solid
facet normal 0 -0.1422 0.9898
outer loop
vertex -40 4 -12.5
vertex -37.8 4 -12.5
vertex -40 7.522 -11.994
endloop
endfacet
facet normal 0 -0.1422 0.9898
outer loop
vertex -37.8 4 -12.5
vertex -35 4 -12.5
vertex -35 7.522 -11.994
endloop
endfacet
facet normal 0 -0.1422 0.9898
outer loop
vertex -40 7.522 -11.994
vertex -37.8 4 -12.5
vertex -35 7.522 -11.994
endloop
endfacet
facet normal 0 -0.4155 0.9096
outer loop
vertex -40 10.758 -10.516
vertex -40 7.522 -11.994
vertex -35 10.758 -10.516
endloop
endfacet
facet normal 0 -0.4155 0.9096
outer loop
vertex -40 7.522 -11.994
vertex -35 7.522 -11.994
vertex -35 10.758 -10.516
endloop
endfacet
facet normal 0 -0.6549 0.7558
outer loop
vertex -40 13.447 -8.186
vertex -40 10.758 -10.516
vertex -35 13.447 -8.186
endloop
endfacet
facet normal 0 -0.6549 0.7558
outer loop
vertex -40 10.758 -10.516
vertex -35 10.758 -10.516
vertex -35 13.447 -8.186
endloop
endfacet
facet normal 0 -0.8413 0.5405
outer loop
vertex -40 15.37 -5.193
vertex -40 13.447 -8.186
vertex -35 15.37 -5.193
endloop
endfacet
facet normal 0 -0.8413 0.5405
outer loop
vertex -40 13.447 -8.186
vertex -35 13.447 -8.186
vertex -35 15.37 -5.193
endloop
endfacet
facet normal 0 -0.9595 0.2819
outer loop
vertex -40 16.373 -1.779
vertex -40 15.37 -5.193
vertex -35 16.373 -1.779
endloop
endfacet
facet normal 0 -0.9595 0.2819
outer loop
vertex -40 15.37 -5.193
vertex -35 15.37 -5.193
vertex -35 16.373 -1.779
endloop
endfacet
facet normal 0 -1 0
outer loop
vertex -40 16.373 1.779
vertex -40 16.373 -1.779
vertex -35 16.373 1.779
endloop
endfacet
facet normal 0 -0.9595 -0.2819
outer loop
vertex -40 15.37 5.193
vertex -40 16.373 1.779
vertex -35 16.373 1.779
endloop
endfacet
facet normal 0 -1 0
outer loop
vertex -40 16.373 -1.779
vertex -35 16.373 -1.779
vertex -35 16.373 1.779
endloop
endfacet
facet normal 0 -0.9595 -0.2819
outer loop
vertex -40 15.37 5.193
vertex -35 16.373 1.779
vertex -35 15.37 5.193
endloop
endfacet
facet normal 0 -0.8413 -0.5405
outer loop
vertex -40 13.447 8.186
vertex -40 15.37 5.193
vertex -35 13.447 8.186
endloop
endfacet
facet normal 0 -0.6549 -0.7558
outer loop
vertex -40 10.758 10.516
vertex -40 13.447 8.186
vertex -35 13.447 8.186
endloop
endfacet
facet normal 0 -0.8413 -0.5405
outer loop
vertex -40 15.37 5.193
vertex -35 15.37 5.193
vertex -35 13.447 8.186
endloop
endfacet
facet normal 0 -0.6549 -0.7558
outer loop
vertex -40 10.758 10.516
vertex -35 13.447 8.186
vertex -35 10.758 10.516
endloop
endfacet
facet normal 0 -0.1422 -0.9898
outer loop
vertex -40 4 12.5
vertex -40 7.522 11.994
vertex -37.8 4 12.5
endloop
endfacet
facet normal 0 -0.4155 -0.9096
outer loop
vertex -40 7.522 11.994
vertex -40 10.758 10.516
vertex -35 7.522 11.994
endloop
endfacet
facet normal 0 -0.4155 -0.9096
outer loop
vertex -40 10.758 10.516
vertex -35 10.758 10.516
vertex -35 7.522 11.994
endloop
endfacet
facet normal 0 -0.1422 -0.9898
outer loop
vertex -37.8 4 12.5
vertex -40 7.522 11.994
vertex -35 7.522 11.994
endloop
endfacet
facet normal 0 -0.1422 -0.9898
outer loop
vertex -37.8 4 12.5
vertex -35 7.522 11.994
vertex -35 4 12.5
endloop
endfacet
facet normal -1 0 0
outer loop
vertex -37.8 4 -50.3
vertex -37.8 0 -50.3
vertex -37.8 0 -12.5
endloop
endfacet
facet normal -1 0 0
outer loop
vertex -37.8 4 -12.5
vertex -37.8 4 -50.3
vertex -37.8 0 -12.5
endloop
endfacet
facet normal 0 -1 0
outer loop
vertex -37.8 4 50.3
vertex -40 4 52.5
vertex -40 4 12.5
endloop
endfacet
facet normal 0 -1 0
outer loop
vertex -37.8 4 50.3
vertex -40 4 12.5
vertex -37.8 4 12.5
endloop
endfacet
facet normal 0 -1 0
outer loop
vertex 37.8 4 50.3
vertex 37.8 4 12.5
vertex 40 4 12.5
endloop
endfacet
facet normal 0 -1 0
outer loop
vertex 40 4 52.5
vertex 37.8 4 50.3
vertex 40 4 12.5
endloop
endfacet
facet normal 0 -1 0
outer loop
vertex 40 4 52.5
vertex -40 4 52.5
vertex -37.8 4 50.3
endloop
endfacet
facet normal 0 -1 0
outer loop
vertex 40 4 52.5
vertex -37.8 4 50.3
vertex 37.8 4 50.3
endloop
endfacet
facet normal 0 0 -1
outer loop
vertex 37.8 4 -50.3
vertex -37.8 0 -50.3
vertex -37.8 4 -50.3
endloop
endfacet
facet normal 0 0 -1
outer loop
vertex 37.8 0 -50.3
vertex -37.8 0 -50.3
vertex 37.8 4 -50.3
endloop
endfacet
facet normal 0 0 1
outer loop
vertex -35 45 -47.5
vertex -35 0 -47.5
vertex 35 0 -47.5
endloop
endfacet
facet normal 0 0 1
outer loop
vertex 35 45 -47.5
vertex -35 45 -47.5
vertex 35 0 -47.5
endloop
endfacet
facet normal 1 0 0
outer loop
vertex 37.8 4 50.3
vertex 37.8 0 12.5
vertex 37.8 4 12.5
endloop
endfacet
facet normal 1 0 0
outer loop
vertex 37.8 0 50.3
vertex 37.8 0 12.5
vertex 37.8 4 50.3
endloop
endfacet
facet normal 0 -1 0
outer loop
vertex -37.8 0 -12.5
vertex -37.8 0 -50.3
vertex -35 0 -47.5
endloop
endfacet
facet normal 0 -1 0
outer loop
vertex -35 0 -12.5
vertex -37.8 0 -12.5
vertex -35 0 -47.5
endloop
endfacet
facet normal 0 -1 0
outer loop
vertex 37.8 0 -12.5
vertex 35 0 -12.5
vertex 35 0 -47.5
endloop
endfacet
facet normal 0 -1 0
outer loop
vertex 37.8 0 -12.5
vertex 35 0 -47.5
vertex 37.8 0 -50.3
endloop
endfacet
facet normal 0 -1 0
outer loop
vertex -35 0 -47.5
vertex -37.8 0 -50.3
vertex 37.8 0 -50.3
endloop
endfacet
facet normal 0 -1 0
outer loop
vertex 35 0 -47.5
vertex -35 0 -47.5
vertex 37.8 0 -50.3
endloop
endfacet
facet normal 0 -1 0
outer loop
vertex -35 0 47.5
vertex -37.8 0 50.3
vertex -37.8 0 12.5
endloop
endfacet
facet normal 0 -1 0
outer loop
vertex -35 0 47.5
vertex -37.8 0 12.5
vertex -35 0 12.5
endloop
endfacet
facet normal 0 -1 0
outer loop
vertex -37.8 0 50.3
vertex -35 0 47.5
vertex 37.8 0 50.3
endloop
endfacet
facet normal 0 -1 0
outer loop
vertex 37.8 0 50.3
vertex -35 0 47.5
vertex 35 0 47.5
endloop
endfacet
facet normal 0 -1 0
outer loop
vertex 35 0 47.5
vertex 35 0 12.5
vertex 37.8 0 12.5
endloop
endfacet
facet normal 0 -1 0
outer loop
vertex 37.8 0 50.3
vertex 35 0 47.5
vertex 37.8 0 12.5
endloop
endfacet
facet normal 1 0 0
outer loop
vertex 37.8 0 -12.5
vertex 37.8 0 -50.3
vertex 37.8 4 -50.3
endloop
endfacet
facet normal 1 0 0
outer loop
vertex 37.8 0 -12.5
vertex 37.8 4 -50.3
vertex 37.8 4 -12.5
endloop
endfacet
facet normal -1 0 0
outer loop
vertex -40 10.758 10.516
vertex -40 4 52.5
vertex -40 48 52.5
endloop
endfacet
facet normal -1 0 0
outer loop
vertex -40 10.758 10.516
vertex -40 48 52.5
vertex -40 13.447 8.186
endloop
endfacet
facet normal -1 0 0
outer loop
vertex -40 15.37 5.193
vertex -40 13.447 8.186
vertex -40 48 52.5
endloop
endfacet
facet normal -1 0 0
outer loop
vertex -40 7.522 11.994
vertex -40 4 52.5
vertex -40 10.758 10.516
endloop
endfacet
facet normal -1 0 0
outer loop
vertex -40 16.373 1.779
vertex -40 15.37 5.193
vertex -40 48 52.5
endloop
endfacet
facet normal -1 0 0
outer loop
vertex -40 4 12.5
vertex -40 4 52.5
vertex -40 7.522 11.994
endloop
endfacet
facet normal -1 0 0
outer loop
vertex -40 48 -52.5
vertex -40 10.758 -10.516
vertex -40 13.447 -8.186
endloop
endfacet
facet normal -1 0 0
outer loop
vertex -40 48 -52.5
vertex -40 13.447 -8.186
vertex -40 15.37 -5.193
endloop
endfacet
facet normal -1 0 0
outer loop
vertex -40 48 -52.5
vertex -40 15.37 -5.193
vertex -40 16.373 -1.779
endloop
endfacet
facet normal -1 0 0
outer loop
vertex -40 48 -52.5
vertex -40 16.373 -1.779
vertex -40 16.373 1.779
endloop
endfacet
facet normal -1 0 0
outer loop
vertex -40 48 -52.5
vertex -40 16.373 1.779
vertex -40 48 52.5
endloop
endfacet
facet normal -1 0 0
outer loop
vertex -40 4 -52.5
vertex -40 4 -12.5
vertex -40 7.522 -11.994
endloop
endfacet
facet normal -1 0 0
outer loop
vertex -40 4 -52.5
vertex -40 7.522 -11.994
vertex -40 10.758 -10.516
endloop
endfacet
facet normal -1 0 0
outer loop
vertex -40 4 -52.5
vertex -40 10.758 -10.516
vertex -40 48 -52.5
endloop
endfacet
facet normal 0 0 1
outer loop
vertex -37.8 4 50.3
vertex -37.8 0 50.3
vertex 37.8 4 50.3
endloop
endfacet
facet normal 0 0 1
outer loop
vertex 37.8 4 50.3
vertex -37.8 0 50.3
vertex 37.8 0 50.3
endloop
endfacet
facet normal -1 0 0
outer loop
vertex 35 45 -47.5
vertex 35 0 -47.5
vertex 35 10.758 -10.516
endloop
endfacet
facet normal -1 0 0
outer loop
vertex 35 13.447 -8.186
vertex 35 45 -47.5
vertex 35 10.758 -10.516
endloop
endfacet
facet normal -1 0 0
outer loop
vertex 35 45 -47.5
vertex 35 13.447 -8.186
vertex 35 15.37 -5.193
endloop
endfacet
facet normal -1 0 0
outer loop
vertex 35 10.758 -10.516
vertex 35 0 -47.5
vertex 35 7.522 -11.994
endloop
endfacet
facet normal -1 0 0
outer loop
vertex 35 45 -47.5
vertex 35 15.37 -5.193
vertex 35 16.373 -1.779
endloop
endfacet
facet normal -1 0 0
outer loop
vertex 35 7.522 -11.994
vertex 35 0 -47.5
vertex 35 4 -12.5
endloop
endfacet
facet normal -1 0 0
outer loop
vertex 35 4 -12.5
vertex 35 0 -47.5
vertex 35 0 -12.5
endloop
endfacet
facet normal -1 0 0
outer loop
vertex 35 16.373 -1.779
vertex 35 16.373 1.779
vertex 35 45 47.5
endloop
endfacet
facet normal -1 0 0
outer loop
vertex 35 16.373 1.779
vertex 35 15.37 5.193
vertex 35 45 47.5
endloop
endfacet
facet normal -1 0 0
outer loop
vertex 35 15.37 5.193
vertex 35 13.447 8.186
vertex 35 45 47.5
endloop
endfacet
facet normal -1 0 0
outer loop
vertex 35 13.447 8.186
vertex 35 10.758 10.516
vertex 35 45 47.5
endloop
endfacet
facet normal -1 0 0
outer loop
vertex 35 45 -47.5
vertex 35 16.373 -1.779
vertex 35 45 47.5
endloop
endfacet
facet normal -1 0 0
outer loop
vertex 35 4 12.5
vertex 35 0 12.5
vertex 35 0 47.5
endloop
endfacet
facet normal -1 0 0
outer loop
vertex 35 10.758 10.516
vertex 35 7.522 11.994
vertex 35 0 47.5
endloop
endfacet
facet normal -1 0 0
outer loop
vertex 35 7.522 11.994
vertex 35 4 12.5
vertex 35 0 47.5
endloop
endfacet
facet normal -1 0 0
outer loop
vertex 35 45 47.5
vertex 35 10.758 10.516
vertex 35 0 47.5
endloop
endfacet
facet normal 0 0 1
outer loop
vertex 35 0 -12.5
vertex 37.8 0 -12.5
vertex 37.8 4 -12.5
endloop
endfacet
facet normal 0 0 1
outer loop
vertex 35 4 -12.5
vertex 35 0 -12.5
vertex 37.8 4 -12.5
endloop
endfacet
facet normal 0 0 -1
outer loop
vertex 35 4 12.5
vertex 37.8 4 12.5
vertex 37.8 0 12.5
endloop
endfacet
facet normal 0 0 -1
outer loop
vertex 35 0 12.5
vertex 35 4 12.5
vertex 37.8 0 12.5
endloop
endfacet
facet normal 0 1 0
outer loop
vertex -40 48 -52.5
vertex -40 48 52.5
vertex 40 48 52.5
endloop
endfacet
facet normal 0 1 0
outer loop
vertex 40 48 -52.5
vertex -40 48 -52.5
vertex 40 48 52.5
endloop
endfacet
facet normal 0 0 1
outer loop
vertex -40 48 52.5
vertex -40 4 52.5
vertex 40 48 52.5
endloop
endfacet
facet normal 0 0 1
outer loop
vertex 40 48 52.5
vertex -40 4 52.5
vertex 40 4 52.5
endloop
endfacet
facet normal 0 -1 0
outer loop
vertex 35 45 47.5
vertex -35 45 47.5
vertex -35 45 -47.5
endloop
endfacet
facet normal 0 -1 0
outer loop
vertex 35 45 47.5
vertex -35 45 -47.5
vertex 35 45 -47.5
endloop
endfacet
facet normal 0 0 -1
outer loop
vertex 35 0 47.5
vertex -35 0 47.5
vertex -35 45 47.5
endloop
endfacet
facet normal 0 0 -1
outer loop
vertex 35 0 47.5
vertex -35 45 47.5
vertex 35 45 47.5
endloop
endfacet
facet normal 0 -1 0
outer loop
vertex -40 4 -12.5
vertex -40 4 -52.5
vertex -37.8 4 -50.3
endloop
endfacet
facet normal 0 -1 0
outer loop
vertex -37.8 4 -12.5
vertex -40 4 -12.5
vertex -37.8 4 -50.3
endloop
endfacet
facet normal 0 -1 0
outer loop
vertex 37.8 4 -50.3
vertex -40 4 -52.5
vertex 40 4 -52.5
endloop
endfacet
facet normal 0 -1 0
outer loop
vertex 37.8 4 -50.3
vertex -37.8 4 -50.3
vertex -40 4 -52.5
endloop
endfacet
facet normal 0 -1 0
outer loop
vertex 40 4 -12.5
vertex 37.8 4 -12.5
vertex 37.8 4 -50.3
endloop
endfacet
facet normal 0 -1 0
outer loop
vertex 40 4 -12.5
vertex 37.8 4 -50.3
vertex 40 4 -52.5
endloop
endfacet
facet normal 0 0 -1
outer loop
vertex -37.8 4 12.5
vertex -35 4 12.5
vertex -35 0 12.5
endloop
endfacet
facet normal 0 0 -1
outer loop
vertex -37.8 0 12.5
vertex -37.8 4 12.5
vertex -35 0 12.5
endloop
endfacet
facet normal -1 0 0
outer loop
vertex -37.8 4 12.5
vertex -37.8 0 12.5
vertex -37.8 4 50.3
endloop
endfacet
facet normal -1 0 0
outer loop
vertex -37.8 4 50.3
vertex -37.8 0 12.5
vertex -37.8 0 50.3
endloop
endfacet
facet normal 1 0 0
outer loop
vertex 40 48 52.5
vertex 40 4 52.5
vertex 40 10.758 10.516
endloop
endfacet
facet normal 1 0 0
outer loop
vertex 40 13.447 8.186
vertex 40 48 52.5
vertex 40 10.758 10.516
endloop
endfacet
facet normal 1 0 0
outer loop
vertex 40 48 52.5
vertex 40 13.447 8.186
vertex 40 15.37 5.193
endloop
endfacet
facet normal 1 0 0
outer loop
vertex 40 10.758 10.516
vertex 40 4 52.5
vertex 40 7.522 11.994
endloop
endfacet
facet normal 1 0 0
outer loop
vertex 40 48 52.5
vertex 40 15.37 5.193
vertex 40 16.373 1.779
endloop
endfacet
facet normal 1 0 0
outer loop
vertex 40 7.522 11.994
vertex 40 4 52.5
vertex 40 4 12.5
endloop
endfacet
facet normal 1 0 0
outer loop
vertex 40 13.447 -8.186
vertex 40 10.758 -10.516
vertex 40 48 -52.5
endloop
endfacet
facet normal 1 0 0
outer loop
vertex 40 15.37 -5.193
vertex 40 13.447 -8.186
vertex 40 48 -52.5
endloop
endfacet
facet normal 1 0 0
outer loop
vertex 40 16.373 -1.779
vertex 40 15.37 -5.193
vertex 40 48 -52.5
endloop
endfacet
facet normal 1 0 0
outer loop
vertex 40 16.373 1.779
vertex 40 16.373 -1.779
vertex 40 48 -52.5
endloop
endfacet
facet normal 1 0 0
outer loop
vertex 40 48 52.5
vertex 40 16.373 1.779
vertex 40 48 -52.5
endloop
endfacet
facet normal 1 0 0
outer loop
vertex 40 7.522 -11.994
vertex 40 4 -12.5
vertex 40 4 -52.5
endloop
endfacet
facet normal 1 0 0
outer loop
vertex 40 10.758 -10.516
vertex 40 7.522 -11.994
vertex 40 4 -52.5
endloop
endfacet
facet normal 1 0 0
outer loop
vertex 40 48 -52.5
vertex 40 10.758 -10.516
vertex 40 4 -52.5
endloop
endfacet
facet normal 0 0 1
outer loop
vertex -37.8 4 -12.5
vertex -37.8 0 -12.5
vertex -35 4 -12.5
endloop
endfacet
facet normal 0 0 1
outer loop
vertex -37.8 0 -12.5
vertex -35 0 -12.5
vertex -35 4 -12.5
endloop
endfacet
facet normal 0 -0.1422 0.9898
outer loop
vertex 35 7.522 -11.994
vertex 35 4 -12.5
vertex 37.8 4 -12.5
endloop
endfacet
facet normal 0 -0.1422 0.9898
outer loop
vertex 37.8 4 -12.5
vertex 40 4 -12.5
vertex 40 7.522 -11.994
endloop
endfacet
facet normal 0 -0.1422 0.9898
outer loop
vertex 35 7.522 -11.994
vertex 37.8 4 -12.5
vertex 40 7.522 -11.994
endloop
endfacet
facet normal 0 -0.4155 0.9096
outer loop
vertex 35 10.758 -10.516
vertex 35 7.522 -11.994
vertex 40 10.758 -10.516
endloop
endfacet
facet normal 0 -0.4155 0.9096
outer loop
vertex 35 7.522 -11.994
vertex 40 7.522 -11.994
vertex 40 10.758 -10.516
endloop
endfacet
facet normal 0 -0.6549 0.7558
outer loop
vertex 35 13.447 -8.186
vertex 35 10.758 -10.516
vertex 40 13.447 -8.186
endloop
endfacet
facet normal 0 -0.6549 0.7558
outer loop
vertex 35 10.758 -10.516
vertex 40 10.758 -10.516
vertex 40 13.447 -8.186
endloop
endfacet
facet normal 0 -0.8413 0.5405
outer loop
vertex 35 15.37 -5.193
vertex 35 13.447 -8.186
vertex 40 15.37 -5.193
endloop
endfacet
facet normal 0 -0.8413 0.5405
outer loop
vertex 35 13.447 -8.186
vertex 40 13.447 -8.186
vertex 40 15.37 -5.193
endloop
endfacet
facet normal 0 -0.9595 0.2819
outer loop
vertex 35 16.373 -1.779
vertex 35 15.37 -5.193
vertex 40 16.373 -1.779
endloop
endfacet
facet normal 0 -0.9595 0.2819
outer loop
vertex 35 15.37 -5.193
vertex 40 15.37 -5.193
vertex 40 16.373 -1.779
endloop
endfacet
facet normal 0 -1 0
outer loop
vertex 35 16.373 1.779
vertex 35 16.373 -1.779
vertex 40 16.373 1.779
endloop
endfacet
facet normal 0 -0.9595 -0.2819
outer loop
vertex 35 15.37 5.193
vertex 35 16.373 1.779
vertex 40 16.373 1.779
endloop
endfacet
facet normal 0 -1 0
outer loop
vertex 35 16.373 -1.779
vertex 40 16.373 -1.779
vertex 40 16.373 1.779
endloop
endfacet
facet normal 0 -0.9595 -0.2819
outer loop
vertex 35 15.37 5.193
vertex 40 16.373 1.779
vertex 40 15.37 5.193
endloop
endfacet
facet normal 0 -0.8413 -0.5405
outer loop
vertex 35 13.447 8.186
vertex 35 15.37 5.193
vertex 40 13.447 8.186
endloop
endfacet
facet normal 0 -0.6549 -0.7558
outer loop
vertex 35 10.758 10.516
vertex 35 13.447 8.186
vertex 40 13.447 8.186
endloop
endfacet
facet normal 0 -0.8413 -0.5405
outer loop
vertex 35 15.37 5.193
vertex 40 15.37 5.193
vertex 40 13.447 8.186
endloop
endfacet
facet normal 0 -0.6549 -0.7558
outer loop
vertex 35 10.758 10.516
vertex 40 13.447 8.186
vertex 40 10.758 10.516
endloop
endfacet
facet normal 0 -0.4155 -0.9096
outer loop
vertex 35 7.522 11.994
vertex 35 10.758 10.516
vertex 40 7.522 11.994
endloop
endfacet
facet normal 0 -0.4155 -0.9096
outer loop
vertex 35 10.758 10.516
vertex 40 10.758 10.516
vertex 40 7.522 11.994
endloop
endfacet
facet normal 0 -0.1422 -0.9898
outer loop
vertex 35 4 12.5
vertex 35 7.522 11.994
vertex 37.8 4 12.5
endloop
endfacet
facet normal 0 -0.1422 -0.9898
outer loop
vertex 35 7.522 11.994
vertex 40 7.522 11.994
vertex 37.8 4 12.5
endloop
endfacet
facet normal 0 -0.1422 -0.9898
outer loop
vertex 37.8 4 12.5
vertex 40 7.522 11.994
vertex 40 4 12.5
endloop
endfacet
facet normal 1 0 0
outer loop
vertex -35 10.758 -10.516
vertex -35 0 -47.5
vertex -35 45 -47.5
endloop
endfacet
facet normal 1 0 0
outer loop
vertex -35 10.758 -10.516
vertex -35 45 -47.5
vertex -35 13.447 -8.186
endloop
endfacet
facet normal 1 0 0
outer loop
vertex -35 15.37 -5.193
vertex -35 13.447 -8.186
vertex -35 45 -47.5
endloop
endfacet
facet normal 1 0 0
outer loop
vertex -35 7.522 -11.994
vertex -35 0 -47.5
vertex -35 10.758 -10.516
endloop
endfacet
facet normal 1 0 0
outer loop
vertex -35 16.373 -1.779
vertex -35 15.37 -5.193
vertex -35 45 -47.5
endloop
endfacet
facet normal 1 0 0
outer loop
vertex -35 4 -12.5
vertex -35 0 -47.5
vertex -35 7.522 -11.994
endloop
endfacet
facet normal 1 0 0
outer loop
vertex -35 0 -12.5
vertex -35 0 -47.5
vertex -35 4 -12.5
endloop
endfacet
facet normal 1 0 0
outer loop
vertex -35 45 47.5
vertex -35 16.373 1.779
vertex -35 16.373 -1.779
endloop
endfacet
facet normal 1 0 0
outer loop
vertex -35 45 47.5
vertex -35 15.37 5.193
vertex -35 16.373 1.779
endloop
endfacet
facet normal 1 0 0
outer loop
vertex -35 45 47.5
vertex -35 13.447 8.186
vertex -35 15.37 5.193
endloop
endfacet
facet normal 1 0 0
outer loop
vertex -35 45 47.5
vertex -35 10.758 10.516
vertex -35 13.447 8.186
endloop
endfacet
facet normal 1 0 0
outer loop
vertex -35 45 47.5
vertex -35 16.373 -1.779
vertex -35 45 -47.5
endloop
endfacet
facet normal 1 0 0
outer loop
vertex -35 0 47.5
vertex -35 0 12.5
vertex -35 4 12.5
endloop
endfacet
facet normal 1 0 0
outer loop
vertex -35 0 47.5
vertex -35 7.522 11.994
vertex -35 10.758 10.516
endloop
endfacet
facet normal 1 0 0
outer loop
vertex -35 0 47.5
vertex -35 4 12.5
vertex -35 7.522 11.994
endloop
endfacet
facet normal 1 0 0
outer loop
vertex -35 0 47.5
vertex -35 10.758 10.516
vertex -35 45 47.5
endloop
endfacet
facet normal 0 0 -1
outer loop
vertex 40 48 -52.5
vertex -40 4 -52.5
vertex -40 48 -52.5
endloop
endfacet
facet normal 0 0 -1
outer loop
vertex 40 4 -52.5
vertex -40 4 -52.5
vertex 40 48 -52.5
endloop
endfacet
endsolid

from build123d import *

# Parameters (mm, degrees)
SKETCH1_W           = 80
SKETCH1_H           = 105
BOSS_EXTRUDE1_DEPTH = 48
SKETCH3_W           = 70
SKETCH3_H           = 95
CUT_EXTRUDE1_DEPTH  = 45
SKETCH4_W           = 80
SKETCH4_H           = 105
SKETCH4_W_2         = 75.6
SKETCH4_H_2         = 100.6
CUT_EXTRUDE2_DEPTH  = 4
CUT_EXTRUDE3_DEPTH  = 108.052557186


with BuildPart() as part:
    # Sketch1 → Boss-Extrude1 (new body)
    with BuildSketch(Plane(origin=(0, 0, 0), x_dir=(1, 0, 0), z_dir=(0, 1, 0))):
        Rectangle(SKETCH1_W, SKETCH1_H)
    extrude(amount=BOSS_EXTRUDE1_DEPTH)

    # Sketch3 → Cut-Extrude1 (cut)
    with BuildSketch(Plane.XZ):
        Rectangle(SKETCH3_W, SKETCH3_H)
    extrude(amount=-CUT_EXTRUDE1_DEPTH, mode=Mode.SUBTRACT)

    # Sketch4 → Cut-Extrude2 (cut)
    with BuildSketch(Plane.XZ):
        Rectangle(SKETCH4_W, SKETCH4_H)
        Rectangle(SKETCH4_W_2, SKETCH4_H_2, mode=Mode.SUBTRACT)
    extrude(amount=-CUT_EXTRUDE2_DEPTH, mode=Mode.SUBTRACT)

    # Sketch5 → Cut-Extrude3 (cut, through all)
    with BuildSketch(Plane(origin=(40, 0, 0), x_dir=(0, 0, -1), z_dir=(1, 0, 0))):
        with BuildLine():
            Line((-12.5, 4), (-12.5, -5.5))
            Line((-12.5, -5.5), (12.5, -5.5))
            Line((12.5, -5.5), (12.5, 4))
            ThreePointArc((12.5, 4), (0, 16.5), (-12.5, 4))
        make_face()
    extrude(amount=-CUT_EXTRUDE3_DEPTH, mode=Mode.SUBTRACT)


solid = part.part
